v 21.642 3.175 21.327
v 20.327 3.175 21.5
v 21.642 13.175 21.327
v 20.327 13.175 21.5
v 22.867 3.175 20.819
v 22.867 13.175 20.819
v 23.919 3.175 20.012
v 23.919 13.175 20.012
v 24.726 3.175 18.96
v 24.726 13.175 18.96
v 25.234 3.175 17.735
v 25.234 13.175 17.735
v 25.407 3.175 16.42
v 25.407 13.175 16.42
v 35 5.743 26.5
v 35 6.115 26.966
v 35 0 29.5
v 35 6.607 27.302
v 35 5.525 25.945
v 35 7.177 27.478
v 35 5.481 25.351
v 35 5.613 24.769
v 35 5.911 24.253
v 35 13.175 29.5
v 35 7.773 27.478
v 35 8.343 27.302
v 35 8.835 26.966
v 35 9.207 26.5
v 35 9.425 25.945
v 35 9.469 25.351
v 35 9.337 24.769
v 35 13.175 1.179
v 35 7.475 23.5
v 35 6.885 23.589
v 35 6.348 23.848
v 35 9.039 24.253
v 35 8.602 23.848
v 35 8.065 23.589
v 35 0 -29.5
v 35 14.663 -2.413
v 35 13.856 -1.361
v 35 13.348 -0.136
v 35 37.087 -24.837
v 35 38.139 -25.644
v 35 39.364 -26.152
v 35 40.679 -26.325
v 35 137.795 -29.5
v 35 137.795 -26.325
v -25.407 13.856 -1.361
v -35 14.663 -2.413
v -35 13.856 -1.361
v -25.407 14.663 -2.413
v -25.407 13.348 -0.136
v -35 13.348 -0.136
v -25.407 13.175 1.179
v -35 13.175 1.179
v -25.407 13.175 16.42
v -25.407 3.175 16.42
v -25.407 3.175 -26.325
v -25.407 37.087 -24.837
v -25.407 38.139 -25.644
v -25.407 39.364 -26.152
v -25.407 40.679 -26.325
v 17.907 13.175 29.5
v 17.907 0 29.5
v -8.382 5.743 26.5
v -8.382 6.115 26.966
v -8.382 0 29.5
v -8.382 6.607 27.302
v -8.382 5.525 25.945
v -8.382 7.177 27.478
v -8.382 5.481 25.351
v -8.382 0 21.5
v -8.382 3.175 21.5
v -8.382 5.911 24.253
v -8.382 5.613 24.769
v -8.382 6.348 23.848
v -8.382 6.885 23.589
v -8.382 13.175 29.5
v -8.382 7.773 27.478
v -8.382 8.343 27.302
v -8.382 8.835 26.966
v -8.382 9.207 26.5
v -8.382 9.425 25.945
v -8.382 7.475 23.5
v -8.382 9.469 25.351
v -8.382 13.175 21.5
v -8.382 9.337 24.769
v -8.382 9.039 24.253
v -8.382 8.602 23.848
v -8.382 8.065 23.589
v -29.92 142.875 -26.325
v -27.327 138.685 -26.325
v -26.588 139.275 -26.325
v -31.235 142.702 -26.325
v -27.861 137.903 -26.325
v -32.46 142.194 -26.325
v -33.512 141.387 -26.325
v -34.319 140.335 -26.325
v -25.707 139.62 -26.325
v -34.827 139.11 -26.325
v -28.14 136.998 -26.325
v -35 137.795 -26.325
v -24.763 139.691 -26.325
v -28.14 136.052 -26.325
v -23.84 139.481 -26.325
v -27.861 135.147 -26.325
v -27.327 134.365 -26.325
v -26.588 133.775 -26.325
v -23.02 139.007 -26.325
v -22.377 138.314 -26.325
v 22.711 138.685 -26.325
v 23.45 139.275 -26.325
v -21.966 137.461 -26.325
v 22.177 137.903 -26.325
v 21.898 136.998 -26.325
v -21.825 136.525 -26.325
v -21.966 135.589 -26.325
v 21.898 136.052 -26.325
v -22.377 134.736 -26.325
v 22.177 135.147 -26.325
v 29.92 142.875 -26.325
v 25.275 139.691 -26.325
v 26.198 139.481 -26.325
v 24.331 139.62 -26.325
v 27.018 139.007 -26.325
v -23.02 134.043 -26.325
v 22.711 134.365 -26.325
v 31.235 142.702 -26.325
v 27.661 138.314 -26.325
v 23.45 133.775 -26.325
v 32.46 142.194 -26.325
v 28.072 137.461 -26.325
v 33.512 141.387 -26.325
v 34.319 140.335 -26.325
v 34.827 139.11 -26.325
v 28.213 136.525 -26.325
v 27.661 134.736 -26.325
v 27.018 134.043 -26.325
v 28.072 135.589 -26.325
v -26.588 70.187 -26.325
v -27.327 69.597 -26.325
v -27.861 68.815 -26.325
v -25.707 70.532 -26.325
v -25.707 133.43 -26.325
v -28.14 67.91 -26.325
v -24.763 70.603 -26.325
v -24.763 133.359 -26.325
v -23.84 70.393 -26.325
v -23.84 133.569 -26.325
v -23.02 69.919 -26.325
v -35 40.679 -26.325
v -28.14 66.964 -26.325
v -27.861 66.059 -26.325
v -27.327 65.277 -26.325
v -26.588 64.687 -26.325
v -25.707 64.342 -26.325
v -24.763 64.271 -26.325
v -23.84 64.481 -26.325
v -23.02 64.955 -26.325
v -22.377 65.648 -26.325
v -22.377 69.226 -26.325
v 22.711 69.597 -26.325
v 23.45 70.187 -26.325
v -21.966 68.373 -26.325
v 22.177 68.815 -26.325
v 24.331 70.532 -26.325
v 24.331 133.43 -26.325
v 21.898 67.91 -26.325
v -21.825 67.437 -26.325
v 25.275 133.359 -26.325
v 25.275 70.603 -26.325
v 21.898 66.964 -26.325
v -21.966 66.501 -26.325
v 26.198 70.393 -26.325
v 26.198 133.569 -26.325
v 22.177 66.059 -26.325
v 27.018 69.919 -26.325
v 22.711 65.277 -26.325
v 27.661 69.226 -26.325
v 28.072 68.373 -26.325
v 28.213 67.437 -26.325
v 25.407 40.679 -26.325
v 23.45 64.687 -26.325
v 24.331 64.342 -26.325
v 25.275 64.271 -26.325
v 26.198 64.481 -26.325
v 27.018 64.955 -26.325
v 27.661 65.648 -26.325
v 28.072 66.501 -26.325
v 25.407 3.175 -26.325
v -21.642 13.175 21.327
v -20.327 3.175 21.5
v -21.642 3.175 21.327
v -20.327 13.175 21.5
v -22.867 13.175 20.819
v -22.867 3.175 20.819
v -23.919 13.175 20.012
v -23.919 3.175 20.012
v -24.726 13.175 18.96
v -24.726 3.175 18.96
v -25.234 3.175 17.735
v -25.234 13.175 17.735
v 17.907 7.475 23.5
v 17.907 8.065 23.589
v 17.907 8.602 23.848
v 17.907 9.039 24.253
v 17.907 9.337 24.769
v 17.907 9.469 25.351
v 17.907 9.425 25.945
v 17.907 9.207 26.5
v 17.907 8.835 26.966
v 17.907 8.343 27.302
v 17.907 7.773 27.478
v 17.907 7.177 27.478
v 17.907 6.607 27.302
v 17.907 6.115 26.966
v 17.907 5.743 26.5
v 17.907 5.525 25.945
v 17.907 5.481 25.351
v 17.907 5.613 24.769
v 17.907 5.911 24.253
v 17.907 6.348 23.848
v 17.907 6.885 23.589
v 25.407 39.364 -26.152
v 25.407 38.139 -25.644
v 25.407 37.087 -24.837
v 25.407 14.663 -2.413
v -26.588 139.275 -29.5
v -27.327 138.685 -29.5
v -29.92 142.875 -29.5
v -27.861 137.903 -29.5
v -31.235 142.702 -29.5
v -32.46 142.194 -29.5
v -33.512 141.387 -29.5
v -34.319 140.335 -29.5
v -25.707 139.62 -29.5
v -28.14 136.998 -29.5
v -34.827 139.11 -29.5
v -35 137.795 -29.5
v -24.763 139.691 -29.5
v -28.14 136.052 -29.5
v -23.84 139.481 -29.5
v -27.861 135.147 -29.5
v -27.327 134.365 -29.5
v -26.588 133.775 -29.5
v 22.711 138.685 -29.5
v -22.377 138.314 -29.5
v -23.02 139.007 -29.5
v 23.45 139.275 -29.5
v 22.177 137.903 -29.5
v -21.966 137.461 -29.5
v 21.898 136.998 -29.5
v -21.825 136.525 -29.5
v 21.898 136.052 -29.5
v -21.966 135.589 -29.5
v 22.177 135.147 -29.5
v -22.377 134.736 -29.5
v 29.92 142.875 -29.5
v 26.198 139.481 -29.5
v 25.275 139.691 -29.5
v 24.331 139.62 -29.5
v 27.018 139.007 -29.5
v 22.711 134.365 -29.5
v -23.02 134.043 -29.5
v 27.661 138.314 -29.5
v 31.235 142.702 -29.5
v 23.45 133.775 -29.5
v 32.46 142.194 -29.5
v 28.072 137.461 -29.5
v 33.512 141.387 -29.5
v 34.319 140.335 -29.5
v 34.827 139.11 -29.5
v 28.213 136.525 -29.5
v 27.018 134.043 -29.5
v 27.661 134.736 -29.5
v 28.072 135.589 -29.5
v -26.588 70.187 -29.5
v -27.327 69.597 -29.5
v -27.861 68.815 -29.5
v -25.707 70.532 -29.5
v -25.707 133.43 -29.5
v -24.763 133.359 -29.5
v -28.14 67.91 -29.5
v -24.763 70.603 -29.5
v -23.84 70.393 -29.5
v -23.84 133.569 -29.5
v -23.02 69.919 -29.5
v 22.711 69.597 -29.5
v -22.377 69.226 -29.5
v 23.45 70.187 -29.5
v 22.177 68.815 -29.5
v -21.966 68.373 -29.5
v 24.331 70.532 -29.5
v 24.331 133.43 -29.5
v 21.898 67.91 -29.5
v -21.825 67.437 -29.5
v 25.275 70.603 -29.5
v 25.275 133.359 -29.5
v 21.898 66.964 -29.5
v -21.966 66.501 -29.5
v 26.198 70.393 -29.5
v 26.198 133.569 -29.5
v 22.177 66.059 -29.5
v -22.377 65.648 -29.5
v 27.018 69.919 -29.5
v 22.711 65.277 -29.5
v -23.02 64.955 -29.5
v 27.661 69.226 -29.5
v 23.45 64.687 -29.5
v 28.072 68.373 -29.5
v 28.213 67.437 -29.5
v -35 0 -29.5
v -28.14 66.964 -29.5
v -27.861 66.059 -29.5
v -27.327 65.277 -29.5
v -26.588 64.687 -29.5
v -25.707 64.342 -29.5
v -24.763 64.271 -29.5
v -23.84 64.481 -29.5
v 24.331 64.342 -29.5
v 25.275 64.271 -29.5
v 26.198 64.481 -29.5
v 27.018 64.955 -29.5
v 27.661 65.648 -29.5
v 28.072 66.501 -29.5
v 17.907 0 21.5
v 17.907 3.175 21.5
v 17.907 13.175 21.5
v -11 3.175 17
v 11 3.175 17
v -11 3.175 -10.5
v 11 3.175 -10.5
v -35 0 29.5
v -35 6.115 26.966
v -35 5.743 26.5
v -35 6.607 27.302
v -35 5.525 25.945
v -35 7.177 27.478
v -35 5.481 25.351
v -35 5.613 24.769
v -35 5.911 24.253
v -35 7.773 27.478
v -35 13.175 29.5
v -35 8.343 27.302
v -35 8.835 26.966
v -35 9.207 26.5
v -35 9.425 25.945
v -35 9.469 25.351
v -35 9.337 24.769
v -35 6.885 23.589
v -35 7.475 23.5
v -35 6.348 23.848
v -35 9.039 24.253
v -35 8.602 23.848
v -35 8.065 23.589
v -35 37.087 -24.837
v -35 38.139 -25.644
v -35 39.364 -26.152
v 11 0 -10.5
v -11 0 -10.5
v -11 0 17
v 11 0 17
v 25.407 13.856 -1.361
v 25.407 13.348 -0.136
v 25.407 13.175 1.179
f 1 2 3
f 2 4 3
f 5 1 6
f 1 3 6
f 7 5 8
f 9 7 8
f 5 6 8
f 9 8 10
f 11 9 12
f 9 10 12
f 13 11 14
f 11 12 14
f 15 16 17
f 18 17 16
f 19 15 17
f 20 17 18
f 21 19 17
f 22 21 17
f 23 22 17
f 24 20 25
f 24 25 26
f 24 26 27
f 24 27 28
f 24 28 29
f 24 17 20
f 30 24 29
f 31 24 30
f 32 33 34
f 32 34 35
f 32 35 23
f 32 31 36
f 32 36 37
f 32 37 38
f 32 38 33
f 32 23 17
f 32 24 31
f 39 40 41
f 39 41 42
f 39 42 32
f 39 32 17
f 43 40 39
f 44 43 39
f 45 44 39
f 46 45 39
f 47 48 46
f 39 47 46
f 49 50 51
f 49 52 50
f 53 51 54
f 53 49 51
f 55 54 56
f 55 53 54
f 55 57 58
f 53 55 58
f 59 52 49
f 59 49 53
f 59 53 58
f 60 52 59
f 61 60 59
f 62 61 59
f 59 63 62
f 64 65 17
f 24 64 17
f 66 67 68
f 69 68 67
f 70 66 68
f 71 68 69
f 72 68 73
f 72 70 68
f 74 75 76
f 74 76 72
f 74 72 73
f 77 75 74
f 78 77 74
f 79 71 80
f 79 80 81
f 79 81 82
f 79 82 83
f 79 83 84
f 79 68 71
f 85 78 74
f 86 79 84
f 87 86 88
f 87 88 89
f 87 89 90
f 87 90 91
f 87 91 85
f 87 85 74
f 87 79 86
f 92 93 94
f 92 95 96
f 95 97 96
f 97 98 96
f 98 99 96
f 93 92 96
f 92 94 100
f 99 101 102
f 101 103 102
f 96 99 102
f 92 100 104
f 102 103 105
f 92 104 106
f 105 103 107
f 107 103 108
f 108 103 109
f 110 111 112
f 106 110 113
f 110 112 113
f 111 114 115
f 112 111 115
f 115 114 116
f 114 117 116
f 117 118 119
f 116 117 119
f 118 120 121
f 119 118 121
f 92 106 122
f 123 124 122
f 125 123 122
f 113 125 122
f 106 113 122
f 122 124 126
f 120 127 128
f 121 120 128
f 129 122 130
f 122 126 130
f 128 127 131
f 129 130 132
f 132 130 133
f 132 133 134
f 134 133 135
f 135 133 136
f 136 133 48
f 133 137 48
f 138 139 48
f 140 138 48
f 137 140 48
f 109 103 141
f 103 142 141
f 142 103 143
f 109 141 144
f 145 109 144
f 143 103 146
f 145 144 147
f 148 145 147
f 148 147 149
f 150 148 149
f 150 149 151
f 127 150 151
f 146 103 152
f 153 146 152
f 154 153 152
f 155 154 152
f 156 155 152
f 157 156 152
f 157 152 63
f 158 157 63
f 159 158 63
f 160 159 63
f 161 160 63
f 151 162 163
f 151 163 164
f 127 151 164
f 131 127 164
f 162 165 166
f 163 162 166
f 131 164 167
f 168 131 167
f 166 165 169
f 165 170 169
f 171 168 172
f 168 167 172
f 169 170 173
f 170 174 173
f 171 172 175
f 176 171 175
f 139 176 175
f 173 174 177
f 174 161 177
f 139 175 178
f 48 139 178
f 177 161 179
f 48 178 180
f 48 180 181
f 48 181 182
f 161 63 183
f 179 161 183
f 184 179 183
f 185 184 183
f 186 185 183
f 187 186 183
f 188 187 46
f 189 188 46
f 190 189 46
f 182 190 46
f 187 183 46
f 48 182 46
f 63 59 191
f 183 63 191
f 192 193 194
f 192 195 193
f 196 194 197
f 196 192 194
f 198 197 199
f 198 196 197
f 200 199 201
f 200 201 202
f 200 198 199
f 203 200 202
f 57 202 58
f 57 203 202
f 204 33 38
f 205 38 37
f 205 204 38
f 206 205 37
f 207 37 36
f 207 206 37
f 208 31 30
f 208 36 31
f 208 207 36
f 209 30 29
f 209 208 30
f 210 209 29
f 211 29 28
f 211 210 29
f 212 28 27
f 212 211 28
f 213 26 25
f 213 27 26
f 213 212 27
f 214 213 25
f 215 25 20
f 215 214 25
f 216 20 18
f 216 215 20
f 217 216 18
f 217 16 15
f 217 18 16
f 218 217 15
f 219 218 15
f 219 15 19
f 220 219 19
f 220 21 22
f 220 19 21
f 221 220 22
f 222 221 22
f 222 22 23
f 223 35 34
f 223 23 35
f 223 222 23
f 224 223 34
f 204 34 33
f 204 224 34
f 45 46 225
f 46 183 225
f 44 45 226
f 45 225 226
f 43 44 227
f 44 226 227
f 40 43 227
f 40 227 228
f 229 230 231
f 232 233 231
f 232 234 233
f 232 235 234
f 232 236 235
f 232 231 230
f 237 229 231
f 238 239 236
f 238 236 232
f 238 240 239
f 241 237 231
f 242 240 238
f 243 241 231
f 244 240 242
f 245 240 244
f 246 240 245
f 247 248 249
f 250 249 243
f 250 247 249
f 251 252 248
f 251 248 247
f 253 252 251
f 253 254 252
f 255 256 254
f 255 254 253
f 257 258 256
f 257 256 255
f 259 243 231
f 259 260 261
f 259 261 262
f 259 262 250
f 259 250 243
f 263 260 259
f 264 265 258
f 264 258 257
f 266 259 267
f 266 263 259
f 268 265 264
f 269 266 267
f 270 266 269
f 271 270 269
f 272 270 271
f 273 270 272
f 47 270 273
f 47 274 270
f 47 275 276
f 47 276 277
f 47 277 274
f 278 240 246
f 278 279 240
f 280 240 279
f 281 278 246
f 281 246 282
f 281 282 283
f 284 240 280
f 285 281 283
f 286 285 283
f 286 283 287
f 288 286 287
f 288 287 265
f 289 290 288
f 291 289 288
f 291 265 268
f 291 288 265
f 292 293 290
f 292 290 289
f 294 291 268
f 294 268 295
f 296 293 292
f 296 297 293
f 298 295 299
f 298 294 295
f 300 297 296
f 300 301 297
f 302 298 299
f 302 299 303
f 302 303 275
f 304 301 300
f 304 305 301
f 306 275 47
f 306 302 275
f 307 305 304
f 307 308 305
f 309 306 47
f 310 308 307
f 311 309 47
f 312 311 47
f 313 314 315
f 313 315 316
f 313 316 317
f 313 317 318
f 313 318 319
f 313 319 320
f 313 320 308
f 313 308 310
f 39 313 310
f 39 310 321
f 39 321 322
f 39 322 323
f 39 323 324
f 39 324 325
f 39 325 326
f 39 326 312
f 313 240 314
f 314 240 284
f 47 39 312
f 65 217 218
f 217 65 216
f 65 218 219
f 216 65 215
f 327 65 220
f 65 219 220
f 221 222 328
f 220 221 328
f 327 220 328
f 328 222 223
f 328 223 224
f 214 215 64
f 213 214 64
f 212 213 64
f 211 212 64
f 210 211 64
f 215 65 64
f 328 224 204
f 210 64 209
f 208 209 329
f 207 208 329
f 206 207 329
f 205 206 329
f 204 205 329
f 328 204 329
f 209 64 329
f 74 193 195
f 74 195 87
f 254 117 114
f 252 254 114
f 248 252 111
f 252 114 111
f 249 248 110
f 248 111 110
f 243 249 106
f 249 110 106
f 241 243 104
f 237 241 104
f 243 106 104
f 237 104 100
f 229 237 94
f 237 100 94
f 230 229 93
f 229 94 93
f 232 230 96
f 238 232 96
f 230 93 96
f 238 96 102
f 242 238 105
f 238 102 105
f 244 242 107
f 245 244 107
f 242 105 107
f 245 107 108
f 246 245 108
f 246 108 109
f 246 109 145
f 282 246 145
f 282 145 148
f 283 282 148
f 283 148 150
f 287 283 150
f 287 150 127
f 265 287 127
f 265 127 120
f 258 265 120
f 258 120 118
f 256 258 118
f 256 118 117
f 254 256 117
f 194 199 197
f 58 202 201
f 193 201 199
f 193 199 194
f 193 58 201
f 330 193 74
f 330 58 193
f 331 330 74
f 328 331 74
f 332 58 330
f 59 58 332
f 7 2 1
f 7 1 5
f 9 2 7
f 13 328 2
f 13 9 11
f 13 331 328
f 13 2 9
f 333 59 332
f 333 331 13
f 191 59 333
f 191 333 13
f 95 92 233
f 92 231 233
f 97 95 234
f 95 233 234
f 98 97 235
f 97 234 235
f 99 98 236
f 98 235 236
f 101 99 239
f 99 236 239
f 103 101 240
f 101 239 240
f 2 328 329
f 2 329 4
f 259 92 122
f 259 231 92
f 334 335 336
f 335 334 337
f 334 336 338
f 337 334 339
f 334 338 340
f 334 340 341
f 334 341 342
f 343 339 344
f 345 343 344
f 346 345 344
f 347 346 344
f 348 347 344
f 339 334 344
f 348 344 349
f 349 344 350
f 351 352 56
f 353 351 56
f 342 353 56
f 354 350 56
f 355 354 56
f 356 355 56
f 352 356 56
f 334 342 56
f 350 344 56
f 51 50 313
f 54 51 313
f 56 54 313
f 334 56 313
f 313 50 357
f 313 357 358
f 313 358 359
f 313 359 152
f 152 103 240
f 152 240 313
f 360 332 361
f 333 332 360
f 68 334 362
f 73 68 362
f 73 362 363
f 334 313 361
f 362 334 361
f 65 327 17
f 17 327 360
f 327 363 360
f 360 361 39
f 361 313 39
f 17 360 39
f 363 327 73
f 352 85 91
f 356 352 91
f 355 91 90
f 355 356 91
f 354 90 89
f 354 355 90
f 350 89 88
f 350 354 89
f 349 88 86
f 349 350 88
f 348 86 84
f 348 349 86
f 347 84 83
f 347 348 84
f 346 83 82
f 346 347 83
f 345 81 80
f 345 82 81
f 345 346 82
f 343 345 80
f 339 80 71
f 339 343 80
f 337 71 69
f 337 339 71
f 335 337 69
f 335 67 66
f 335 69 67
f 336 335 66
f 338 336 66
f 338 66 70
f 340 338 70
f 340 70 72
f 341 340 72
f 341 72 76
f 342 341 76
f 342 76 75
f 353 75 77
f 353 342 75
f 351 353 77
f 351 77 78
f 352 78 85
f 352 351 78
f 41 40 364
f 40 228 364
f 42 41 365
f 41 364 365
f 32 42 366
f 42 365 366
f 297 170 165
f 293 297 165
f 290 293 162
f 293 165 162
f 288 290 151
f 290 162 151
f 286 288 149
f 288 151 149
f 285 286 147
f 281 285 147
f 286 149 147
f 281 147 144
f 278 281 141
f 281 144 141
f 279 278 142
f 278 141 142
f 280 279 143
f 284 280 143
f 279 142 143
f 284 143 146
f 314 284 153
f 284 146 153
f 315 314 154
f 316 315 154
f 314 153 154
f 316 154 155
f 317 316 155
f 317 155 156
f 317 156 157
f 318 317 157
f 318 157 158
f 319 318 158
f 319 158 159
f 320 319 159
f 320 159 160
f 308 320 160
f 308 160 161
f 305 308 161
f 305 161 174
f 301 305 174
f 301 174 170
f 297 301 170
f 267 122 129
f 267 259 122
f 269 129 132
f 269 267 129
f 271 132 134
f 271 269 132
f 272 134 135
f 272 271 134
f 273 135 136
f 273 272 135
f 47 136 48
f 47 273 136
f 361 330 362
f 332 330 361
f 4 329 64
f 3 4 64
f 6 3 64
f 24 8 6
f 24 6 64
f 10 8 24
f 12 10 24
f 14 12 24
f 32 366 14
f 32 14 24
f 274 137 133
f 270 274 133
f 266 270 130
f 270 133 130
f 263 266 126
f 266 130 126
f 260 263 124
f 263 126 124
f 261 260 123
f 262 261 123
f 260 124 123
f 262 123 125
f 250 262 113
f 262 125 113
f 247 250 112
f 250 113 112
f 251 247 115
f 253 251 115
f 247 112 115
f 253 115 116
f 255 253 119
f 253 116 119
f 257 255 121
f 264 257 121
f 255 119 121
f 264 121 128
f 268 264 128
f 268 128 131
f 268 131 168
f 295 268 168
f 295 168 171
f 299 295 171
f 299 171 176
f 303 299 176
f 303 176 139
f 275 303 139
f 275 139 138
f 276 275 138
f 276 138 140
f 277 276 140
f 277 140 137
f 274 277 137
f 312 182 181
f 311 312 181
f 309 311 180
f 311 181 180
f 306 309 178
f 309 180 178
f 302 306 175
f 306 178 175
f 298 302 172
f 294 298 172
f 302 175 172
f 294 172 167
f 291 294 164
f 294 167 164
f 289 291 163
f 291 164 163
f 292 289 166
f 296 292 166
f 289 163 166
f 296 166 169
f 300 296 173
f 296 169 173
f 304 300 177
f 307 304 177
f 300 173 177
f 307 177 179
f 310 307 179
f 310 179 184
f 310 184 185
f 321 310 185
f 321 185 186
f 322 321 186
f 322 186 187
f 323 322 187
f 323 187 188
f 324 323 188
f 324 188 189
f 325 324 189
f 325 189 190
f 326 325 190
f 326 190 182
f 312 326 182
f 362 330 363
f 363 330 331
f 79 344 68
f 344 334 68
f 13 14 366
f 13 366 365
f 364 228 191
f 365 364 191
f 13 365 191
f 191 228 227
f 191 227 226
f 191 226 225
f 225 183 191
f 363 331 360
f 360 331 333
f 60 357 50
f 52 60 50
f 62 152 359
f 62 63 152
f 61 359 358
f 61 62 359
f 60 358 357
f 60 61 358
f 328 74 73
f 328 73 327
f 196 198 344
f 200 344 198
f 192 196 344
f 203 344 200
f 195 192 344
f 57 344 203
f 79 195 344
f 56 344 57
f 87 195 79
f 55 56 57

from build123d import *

# Parameters (mm, degrees)
SKETCH1_W               = 70
SKETCH1_H               = 59
BOSS_EXTRUDE1_DEPTH     = 3.175
SKETCH2_W               = 70
SKETCH2_H               = 3.175
BOSS_EXTRUDE2_DEPTH     = 139.7
SKETCH4_W               = 7.5
SKETCH4_H               = 8
BOSS_EXTRUDE3_DEPTH     = 10
SKETCH5_W               = 26.289
SKETCH5_H               = 8
CUT_EXTRUDE2_DEPTH      = 10
SKETCH3_R               = 3.175
CUT_EXTRUDE1_DEPTH      = 139.7
SKETCH9_W               = 9.593
SKETCH9_H               = 55.825
BOSS_EXTRUDE4_DEPTH     = 10
SKETCH7_W               = 22
SKETCH7_H               = 27.5
CUT_EXTRUDE6_DEPTH      = 10
CUT_EXTRUDE7_DEPTH      = 153.202212694
CUT_EXTRUDE7_DEPTH_BACK = 153.202212694
SKETCH12_R              = 2
BOSS_EXTRUDE5_DEPTH     = 9.593
BOSS_EXTRUDE6_DEPTH     = 9.593
FILLET1_R               = 5.08
FILLET2_R               = 5.08
FILLET3_R               = 5.08


with BuildPart() as part:
    # Sketch1 → Boss-Extrude1 (new body)
    with BuildSketch(Plane(origin=(0, 0, 0), x_dir=(1, 0, 0), z_dir=(0, 1, 0))):
        Rectangle(SKETCH1_W, SKETCH1_H)
    extrude(amount=BOSS_EXTRUDE1_DEPTH)

    # Sketch2 → Boss-Extrude2 (add)
    with BuildSketch(Plane(origin=(0, 3.175, 0), x_dir=(1, 0, 0), z_dir=(0, 1, 0))):
        with Locations((0, 27.9125)):
            Rectangle(SKETCH2_W, SKETCH2_H)
    extrude(amount=BOSS_EXTRUDE2_DEPTH)

    # Sketch4 → Boss-Extrude3 (add)
    with BuildSketch(Plane(origin=(0, 3.175, 0), x_dir=(1, 0, 0), z_dir=(0, 1, 0))):
        with Locations((-12.132, -25.5)):
            Rectangle(SKETCH4_W, SKETCH4_H)
        with Locations((21.657, -25.5)):
            Rectangle(SKETCH4_W, SKETCH4_H)
    extrude(amount=BOSS_EXTRUDE3_DEPTH)

    # Sketch5 → Cut-Extrude2 (cut)
    with BuildSketch(Plane(origin=(0, 3.175, 0), x_dir=(1, 0, 0), z_dir=(0, 1, 0))):
        with Locations((4.7625, -25.5)):
            Rectangle(SKETCH5_W, SKETCH5_H)
    extrude(amount=-CUT_EXTRUDE2_DEPTH, mode=Mode.SUBTRACT)

    # Sketch3 → Cut-Extrude1 (cut)
    with BuildSketch(Plane.XY.offset(-26.325)):
        with Locations((-25, 136.525)):
            Circle(SKETCH3_R)
        with Locations((25.038, 136.525)):
            Circle(SKETCH3_R)
        with Locations((25.038, 67.437)):
            Circle(SKETCH3_R)
        with Locations((-25, 67.437)):
            Circle(SKETCH3_R)
    extrude(amount=-CUT_EXTRUDE1_DEPTH, mode=Mode.SUBTRACT)

    # Sketch9 → Boss-Extrude4 (add)
    with BuildSketch(Plane(origin=(0, 3.175, 0), x_dir=(1, 0, 0), z_dir=(0, 1, 0))):
        with Locations((30.2035, -1.5875)):
            Rectangle(SKETCH9_W, SKETCH9_H)
        Polygon((-25.407, 26.325), (-35, 26.325), (-35, -29.5), (-25.407, -29.5), (-15.882, -29.5), (-15.882, -21.5), (-25.407, -21.5), align=None)
    extrude(amount=BOSS_EXTRUDE4_DEPTH)

    # Sketch7 → Cut-Extrude6 (cut)
    with BuildSketch(Plane(origin=(0, 3.175, 0), x_dir=(1, 0, 0), z_dir=(0, 1, 0))):
        with Locations((0, -3.25)):
            Rectangle(SKETCH7_W, SKETCH7_H)
    extrude(amount=-CUT_EXTRUDE6_DEPTH, mode=Mode.SUBTRACT)

    # Sketch12 → Cut-Extrude7 (cut, two sides: drawn at the far end of the back side and taken through both)
    with BuildSketch(Plane(origin=(-8.382, 0, 0), x_dir=(0, 0, -1), z_dir=(1, 0, 0)).offset(-CUT_EXTRUDE7_DEPTH_BACK)):
        with Locations((-25.5, 7.475)):
            Circle(SKETCH12_R)
    extrude(amount=CUT_EXTRUDE7_DEPTH + CUT_EXTRUDE7_DEPTH_BACK, mode=Mode.SUBTRACT)

    # Sketch13 → Boss-Extrude5 (add)
    with BuildSketch(Plane.ZY.offset(35)):
        Polygon((-26.325, 13.175), (-26.325, 38.575), (-0.925, 13.175), align=None)
    extrude(amount=-BOSS_EXTRUDE5_DEPTH)

    # Sketch14 → Boss-Extrude6 (add)
    with BuildSketch(Plane(origin=(35, 0, 0), x_dir=(0, 0, -1), z_dir=(1, 0, 0))):
        Polygon((26.325, 13.175), (26.325, 38.575), (0.925, 13.175), align=None)
    extrude(amount=-BOSS_EXTRUDE6_DEPTH)

    # Fillet1
    fillet1_edges = [part.edges().sort_by_distance(p)[0] for p in [
        (-35, 142.875, -27.9125),
        (35, 142.875, -27.9125),
    ]]
    fillet(fillet1_edges, radius=FILLET1_R)

    # Fillet2
    fillet2_edges = [part.edges().sort_by_distance(p)[0] for p in [
        (-30.2035, 13.175, -0.925),
        (-30.2035, 38.575, -26.325),
        (30.2035, 13.175, -0.925),
        (30.2035, 38.575, -26.325),
    ]]
    fillet(fillet2_edges, radius=FILLET2_R)

    # Fillet3
    fillet3_edges = [part.edges().sort_by_distance(p)[0] for p in [
        (-25.407, 8.175, 21.5),
        (25.407, 8.175, 21.5),
    ]]
    fillet(fillet3_edges, radius=FILLET3_R)


solid = part.part
